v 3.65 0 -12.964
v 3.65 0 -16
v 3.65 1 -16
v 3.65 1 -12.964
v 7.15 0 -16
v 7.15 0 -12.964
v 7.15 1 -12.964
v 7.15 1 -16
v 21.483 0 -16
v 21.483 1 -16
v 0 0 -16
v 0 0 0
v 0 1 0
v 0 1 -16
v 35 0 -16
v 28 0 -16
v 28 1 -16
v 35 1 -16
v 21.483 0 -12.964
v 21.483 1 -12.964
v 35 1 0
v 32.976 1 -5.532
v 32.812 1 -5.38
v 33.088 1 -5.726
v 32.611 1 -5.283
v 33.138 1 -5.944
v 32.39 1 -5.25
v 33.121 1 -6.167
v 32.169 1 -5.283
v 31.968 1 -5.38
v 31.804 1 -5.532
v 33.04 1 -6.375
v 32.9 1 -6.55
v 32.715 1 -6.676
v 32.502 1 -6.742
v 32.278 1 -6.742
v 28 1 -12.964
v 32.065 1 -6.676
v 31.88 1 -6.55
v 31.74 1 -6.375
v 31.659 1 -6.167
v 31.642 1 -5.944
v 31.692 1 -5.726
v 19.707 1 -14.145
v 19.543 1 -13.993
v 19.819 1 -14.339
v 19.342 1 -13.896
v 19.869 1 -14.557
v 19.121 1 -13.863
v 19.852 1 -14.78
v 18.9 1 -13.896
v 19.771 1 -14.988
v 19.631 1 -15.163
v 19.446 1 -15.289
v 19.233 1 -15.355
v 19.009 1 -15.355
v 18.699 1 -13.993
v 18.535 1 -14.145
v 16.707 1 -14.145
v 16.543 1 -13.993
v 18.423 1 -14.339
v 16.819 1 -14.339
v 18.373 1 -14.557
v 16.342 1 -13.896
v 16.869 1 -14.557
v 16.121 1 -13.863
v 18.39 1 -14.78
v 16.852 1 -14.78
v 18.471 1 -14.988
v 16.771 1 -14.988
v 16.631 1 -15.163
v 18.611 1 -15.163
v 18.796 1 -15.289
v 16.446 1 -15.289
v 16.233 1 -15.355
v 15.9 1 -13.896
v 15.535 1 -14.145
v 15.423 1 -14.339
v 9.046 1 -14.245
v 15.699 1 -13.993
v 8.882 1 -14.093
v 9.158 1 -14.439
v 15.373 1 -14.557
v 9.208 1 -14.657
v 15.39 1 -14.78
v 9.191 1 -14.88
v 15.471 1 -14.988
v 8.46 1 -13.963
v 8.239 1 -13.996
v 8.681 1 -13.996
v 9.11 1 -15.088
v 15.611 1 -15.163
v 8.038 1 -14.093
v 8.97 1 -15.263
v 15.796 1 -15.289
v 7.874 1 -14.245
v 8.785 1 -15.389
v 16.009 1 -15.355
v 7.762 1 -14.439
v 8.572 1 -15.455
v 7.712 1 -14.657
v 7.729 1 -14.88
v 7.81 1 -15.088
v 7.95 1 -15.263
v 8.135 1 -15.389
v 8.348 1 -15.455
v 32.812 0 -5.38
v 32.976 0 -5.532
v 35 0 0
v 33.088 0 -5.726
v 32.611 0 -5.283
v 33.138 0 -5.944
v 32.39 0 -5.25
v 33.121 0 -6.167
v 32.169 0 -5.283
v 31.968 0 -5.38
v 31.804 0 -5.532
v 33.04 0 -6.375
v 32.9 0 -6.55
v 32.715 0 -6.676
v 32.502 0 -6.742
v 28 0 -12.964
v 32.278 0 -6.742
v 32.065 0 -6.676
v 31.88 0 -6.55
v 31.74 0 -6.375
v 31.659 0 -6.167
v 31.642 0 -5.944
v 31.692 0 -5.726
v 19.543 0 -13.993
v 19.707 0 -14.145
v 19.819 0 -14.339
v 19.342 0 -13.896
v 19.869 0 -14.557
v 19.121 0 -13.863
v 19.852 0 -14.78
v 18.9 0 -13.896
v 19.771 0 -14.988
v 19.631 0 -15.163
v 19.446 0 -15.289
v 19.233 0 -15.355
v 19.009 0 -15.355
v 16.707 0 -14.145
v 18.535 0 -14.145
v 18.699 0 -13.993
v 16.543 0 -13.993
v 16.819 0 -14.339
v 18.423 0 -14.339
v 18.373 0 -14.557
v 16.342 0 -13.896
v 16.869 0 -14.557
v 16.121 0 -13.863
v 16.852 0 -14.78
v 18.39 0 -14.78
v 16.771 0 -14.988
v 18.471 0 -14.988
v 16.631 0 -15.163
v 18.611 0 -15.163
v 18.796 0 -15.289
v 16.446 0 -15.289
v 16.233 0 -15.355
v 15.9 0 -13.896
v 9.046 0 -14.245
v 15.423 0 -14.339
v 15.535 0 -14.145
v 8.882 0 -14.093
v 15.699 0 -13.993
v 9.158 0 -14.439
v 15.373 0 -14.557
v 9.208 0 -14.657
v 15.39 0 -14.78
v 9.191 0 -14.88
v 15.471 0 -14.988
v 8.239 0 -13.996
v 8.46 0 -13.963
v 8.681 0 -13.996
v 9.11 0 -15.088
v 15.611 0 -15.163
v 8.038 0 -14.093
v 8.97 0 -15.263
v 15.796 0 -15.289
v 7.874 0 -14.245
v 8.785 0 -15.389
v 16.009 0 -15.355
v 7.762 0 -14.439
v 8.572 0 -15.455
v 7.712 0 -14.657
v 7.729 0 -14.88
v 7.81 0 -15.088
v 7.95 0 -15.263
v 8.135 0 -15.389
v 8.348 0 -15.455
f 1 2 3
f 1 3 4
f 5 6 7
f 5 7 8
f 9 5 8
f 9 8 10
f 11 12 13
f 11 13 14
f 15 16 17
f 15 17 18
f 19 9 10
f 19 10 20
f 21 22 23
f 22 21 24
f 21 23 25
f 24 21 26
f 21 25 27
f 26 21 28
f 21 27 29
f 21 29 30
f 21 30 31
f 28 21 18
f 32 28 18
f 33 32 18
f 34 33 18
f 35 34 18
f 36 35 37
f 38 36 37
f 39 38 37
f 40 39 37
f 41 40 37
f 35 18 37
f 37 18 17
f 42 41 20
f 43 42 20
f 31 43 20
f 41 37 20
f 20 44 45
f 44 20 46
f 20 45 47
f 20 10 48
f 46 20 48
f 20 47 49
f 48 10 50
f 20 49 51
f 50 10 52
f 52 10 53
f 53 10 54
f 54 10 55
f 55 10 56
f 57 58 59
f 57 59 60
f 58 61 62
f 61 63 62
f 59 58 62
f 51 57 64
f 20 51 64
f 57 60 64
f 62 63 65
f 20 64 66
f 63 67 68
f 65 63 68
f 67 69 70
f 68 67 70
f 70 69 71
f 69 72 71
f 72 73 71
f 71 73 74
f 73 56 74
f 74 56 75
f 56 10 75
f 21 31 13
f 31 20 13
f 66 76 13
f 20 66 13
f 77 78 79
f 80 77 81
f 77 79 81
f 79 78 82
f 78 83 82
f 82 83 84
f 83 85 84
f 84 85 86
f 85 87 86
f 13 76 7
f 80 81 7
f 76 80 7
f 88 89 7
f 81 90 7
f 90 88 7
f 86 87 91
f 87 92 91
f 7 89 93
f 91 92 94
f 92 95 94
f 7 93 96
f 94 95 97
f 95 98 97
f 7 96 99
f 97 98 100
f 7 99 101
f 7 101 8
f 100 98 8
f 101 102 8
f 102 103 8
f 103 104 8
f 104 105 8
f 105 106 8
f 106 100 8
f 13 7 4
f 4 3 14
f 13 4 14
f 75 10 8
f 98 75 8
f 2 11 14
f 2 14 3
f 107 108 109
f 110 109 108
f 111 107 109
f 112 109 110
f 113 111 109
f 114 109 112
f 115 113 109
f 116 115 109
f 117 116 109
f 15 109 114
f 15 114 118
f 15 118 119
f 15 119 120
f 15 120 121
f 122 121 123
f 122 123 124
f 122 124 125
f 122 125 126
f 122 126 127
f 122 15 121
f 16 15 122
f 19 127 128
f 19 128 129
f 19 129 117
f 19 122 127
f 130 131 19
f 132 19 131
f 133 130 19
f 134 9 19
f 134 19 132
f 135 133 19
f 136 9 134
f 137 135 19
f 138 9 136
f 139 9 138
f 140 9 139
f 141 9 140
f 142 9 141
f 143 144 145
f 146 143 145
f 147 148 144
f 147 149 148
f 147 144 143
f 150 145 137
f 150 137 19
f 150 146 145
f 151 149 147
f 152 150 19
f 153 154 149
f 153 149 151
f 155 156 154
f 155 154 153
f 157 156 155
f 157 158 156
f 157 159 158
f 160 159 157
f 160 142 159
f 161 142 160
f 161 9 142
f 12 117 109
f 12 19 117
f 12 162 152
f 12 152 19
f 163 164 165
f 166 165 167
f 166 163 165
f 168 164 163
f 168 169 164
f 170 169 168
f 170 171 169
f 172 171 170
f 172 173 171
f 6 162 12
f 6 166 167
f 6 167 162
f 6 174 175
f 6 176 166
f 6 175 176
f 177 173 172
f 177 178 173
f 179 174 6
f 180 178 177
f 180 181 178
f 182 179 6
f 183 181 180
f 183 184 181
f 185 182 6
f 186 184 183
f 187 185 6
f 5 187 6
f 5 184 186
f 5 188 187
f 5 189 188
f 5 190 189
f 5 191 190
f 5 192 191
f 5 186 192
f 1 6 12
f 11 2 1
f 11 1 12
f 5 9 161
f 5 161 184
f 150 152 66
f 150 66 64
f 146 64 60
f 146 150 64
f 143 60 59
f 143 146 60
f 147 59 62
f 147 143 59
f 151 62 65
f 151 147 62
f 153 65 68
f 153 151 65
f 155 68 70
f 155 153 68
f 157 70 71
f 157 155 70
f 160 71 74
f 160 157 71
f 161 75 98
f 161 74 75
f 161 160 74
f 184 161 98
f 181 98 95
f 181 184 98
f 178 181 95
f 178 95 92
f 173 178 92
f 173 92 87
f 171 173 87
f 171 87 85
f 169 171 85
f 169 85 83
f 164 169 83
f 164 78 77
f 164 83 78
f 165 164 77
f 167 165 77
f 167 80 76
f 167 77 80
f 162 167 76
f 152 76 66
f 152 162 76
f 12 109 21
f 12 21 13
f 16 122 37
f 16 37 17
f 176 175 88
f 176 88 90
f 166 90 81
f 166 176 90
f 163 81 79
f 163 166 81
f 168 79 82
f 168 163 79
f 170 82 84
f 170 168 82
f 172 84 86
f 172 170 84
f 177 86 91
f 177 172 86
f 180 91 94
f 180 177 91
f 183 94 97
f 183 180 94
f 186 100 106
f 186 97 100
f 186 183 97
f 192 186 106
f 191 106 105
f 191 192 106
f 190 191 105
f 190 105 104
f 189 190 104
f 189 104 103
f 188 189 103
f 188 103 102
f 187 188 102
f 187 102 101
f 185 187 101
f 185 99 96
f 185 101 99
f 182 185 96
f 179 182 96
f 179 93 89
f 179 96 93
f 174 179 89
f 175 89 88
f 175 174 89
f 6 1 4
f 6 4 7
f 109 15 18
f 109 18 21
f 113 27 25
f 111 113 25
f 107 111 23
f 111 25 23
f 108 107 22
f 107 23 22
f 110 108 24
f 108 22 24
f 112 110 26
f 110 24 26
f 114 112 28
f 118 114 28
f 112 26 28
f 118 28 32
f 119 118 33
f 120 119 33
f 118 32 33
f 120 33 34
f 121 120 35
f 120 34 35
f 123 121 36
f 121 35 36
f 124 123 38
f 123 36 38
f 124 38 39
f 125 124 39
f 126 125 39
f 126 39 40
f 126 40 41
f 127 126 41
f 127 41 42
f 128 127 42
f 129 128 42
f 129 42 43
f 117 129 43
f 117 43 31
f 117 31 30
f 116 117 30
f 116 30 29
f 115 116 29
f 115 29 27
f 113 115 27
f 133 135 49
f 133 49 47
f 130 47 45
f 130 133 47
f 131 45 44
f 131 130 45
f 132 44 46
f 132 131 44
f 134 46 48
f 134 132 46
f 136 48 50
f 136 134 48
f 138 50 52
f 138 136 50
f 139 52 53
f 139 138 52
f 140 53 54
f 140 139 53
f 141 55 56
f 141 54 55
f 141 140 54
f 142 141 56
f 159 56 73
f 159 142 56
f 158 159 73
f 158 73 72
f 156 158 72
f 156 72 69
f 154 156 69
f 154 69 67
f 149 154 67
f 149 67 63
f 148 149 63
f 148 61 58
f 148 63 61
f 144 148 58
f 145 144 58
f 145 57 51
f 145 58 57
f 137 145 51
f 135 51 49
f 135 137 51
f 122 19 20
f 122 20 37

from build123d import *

# Parameters (mm, degrees)
BOSS_EXTRUDE1_DEPTH     = 1
SKETCH3_R               = 0.75
CUT_EXTRUDE2_DEPTH      = 39.49675311
CUT_EXTRUDE3_DEPTH      = 39.49675311
CUT_EXTRUDE3_DEPTH_BACK = 39.49675311
SKETCH4_R               = 0.75


with BuildPart() as part:
    # Sketch1 → Boss-Extrude1 (new body)
    with BuildSketch(Plane(origin=(0, 0, 0), x_dir=(1, 0, 0), z_dir=(0, 1, 0))):
        Polygon((0, 0), (0, 16), (3.65, 16), (3.65, 12.964), (7.15, 12.964), (7.15, 16), (21.483, 16), (21.483, 12.964), (28, 12.964), (28, 16), (35, 16), (35, 0), align=None)
    extrude(amount=BOSS_EXTRUDE1_DEPTH)

    # Sketch3 → Cut-Extrude2 (cut, through all)
    with BuildSketch(Plane(origin=(0, 1, 0), x_dir=(1, 0, 0), z_dir=(0, 1, 0))):
        with Locations(Location((32.39, 6, 0), (0, 0, 270))):
            Circle(SKETCH3_R)
    extrude(amount=-CUT_EXTRUDE2_DEPTH, mode=Mode.SUBTRACT)

    # Sketch4 → Cut-Extrude3 (cut, two sides: drawn at the far end of the back side and taken through both)
    with BuildSketch(Plane(origin=(0, 1, 0), x_dir=(1, 0, 0), z_dir=(0, 1, 0)).offset(-CUT_EXTRUDE3_DEPTH_BACK)):
        with Locations(Location((8.46, 14.713, 0), (0, 0, 270))):
            Circle(SKETCH4_R)
        with Locations(Location((16.121, 14.613, 0), (0, 0, 270))):
            Circle(SKETCH4_R)
        with Locations(Location((19.121, 14.613, 0), (0, 0, 270))):
            Circle(SKETCH4_R)
    extrude(amount=CUT_EXTRUDE3_DEPTH + CUT_EXTRUDE3_DEPTH_BACK, mode=Mode.SUBTRACT)


solid = part.part
